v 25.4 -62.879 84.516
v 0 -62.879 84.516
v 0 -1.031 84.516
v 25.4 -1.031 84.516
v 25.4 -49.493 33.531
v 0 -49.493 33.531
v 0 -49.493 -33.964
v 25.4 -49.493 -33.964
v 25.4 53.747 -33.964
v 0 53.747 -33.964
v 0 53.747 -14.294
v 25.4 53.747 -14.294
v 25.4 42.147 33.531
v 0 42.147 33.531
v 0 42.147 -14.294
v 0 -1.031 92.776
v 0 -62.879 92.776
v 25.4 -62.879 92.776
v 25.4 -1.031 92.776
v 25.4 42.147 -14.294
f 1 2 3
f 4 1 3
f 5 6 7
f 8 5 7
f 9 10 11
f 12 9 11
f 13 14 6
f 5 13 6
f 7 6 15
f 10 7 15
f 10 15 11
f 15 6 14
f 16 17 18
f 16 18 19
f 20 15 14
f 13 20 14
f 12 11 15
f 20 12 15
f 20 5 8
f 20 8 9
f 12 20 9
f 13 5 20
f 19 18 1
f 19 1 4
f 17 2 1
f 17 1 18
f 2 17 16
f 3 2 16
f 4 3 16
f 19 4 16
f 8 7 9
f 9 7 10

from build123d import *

# Parameters (mm, degrees)
F0_W     = 11.6000063717
F0_H     = 19.6698009968
F1_DEPTH = 25.4
F0_W_2   = 61.8476495147
F0_H_2   = 8.259370923


with BuildPart() as f1:
    # F0 (on Right) → F1 (new body)
    with BuildSketch(Plane.YZ):
        with Locations((47.9467269033, -24.1293162107)):
            Rectangle(F0_W, F0_H)
        with Locations((36.3467205316, -24.1293162107)):
            Rectangle(F0_W, F0_H)
        Polygon((-49.493253231, -33.9642167091), (30.5467173457, -33.9642167091), (30.5467173457, -14.2944157124), (42.1467237175, -14.2944157124), (42.1467237175, 33.5307754576), (-49.493253231, 33.5307754576), align=None)
    extrude(amount=F1_DEPTH)


with BuildPart() as f1b:
    # F0 (on Right) → F1, piece 2 (new body)
    with BuildSketch(Plane.YZ):
        with Locations((-31.9549031556, 88.6460468173)):
            Rectangle(F0_W_2, F0_H_2)
    extrude(amount=F1_DEPTH)


solid = Compound([f1.part, f1b.part])
